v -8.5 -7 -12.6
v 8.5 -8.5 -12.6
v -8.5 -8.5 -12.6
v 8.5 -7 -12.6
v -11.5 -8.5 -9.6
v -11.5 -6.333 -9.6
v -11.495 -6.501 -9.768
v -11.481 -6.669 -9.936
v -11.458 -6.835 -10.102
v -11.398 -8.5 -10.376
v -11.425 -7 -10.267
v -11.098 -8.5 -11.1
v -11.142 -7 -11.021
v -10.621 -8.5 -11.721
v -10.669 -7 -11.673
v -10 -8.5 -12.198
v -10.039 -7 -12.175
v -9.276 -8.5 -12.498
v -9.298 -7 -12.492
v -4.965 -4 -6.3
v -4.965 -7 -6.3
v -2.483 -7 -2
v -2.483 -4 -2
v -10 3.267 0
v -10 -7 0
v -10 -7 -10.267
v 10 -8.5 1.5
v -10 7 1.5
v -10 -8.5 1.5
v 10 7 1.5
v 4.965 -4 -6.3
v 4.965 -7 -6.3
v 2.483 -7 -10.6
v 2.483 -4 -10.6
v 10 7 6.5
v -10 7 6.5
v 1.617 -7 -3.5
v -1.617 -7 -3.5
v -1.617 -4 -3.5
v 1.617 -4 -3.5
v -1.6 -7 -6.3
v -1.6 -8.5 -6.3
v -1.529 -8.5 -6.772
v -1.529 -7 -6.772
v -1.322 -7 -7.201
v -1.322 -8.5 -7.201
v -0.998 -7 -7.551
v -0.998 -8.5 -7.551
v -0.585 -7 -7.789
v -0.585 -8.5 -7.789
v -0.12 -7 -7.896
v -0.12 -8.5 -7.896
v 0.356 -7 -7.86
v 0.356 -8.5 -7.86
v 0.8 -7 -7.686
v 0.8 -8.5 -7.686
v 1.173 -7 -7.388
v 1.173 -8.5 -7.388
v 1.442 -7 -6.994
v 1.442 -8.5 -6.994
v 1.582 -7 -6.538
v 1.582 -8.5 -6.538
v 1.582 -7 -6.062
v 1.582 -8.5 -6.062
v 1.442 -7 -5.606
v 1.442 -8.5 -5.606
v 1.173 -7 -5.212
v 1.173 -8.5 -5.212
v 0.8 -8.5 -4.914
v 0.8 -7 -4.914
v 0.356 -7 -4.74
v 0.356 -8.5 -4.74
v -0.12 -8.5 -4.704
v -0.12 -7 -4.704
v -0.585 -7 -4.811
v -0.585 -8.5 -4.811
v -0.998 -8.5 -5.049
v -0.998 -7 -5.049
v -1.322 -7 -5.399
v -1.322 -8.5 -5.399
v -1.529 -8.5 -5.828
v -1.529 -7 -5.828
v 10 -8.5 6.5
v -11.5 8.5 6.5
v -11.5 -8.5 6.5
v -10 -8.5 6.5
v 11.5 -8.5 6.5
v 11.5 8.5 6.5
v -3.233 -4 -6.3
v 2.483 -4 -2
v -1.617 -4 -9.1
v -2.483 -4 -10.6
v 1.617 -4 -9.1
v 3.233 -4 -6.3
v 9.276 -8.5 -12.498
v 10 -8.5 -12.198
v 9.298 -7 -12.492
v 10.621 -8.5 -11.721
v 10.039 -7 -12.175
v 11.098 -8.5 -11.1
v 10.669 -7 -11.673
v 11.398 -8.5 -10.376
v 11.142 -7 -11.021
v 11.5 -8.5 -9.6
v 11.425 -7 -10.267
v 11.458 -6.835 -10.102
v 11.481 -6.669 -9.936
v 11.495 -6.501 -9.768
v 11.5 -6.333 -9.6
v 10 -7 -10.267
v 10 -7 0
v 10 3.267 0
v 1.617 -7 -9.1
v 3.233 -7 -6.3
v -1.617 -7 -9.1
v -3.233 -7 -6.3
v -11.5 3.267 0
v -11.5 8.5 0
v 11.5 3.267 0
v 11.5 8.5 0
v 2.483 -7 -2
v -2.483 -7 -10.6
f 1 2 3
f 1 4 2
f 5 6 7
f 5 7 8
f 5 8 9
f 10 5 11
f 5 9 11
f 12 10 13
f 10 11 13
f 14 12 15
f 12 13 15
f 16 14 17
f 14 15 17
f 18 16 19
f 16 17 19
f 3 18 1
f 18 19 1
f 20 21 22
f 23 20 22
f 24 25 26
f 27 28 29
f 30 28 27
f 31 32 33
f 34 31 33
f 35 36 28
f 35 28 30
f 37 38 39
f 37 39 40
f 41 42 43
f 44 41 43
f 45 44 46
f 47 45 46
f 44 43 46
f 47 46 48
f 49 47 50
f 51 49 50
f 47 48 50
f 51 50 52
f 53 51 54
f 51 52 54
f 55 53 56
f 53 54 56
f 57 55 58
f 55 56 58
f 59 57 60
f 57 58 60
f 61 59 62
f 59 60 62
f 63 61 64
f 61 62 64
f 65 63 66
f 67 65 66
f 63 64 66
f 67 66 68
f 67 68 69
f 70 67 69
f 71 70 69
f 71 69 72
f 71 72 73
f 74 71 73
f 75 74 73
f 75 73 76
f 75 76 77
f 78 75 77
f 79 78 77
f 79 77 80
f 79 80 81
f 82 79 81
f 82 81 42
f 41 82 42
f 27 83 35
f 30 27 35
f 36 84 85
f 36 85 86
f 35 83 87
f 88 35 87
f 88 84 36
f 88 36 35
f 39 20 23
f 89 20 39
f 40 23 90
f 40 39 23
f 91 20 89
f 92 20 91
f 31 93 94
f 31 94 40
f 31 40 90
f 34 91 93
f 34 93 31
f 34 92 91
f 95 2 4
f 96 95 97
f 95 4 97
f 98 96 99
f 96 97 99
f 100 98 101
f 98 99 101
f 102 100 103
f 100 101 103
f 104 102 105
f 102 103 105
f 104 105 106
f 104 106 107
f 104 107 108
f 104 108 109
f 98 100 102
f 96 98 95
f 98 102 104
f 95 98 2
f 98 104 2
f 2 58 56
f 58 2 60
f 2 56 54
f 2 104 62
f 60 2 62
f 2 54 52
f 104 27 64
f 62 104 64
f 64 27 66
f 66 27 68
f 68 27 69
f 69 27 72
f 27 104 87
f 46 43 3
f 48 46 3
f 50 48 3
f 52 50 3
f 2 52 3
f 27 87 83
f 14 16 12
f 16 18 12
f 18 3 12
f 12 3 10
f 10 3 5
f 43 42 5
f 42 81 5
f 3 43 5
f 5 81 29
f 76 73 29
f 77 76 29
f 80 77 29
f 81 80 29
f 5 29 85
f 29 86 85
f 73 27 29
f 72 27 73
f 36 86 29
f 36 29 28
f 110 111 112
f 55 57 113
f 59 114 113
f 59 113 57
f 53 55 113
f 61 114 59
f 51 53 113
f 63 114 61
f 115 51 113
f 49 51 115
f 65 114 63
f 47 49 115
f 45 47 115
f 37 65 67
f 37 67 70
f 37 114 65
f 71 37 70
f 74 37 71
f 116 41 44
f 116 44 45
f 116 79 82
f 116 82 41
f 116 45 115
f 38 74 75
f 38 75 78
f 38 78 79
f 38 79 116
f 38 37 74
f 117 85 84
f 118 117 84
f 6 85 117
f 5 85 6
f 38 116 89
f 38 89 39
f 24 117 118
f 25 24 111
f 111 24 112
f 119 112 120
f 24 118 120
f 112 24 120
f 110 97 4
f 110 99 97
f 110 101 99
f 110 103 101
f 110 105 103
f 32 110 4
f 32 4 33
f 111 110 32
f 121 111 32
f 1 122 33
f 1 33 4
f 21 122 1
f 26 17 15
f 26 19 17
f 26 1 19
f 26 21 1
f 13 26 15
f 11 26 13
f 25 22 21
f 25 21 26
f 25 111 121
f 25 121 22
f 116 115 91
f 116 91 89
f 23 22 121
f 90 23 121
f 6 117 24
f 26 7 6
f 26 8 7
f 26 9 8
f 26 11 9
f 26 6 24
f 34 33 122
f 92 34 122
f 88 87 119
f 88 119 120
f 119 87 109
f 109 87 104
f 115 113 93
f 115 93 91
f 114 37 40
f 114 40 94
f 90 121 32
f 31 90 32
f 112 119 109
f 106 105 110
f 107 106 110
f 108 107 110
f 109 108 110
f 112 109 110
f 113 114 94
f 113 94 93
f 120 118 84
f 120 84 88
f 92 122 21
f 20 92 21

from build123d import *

# Parameters (mm, degrees)
SKETCH_1_W                  = 23
SKETCH_1_H                  = 17
EXTRUDE_1_DEPTH             = 6.5
SKETCH_2_W                  = 20
SKETCH_2_H                  = 15.5
CUT_EXTRUDE_1_DEPTH         = 5
SKETCH_3_W                  = 23
SKETCH_3_H                  = 1.5
EXTRUDE_2_DEPTH             = 12.6
EXTRUDE_3_DEPTH             = 3
EXTRUDE_6_REACH             = 21.397
SKETCH_7_W                  = 1.5
SKETCH_7_H                  = 7.259859141
EXTRUDE_6_DIRECTION_2_REACH = 21.397
HOLE_WIZARD_M3_1_D          = 3.2
FILLET_1_R                  = 3


with BuildPart() as part:
    # 草图1 → 凸台-拉伸1 (new body)
    with BuildSketch(Plane.XY):
        Rectangle(SKETCH_1_W, SKETCH_1_H)
    extrude(amount=EXTRUDE_1_DEPTH)

    # 草图2 → 切除-拉伸1 (cut)
    with BuildSketch(Plane.XY.offset(6.5)):
        with Locations((0, -0.75)):
            Rectangle(SKETCH_2_W, SKETCH_2_H)
    extrude(amount=-CUT_EXTRUDE_1_DEPTH, mode=Mode.SUBTRACT)

    # 草图3 → 凸台-拉伸2 (add)
    with BuildSketch(Plane(origin=(0, 0, 0), x_dir=(-1, 0, 0), z_dir=(0, 0, -1))):
        with Locations((0, -7.75)):
            Rectangle(SKETCH_3_W, SKETCH_3_H)
    extrude(amount=EXTRUDE_2_DEPTH)

    # 草图4 → 凸台-拉伸3 (add)
    with BuildSketch(Plane(origin=(0, -7, 0), x_dir=(1, 0, 0), z_dir=(0, 1, 0))):
        Polygon((4.965212315, 6.3), (2.482606158, 10.6), (-2.482606158, 10.6), (-4.965212315, 6.3), (-2.482606158, 2), (2.482606158, 2), align=None)
        Polygon((3.233161507, 6.3), (1.616580754, 9.1), (-1.616580754, 9.1), (-3.233161507, 6.3), (-1.616580754, 3.5), (1.616580754, 3.5), align=None, mode=Mode.SUBTRACT)
    extrude(amount=EXTRUDE_3_DEPTH)

    # 凸台-拉伸6: up to this face of the body (flat: up to its plane)
    extrude_6_end = Plane(part.part.faces().sort_by_distance((0, -7, -6.3))[0])
    # 草图7 → 凸台-拉伸6 (add, up to the picked face)
    with BuildSketch(Plane(origin=(0, -3.5, -3.5), x_dir=(-1, 0, 0), z_dir=(0, -0.7071067811865475, -0.7071067811865477)), mode=Mode.PRIVATE) as extrude_6_sk1:
        with Locations((-10.75, -1.319817897)):
            Rectangle(SKETCH_7_W, SKETCH_7_H)
    extrude_6_tool1 = split(extrude(extrude_6_sk1.sketch, amount=EXTRUDE_6_REACH, mode=Mode.PRIVATE), bisect_by=extrude_6_end, keep=Keep.BOTH, mode=Mode.PRIVATE)
    extrude_6 = extrude_6_tool1.solids().sort_by(Axis((10.75, -4.433252, -2.566748), (0, -0.7071067811865475, -0.7071067811865477)))[0]
    add(extrude_6)

    # 凸台-拉伸6 direction 2: up to this face of the body (flat: up to its plane)
    extrude_6_direction_2_end = Plane(part.part.faces().sort_by_distance((0, 0.75, 0))[0])
    # 草图7 → 凸台-拉伸6 direction 2 (add, up to the picked face)
    with BuildSketch(Plane(origin=(0, -3.5, -3.5), x_dir=(-1, 0, 0), z_dir=(0, -0.7071067811865475, -0.7071067811865477)), mode=Mode.PRIVATE) as extrude_6_direction_2_sk1:
        with Locations((-10.75, -1.319817897)):
            Rectangle(SKETCH_7_W, SKETCH_7_H)
    extrude_6_direction_2_tool1 = split(extrude(extrude_6_direction_2_sk1.sketch, amount=-EXTRUDE_6_DIRECTION_2_REACH, mode=Mode.PRIVATE), bisect_by=extrude_6_direction_2_end, keep=Keep.BOTH, mode=Mode.PRIVATE)
    extrude_6_direction_2 = extrude_6_direction_2_tool1.solids().sort_by(Axis((10.75, -4.433252, -2.566748), (0, 0.7071067811865475, 0.7071067811865477)))[0]
    add(extrude_6_direction_2)

    # 镜向1: 凸台-拉伸6, 凸台-拉伸6 direction 2 across plane
    add(extrude_6.mirror(Plane(origin=(0, 0, 0), x_dir=(0, 0, 1), z_dir=(1, 0, 0))))
    add(extrude_6_direction_2.mirror(Plane(origin=(0, 0, 0), x_dir=(0, 0, 1), z_dir=(1, 0, 0))))

    # M3 间隙孔1 (through all)
    with Locations(Plane(origin=(0, -7, 0), x_dir=(1, 0, 0), z_dir=(0, 1, 0))):
        with Locations((0, 6.3)):
            Hole(HOLE_WIZARD_M3_1_D / 2)

    # 圆角1
    fillet_1_edges = [part.edges().sort_by_distance(p)[0] for p in [
        (-11.5, -7.75, -12.6),
        (11.5, -7.75, -12.6),
    ]]
    fillet(fillet_1_edges, radius=FILLET_1_R)


solid = part.part
